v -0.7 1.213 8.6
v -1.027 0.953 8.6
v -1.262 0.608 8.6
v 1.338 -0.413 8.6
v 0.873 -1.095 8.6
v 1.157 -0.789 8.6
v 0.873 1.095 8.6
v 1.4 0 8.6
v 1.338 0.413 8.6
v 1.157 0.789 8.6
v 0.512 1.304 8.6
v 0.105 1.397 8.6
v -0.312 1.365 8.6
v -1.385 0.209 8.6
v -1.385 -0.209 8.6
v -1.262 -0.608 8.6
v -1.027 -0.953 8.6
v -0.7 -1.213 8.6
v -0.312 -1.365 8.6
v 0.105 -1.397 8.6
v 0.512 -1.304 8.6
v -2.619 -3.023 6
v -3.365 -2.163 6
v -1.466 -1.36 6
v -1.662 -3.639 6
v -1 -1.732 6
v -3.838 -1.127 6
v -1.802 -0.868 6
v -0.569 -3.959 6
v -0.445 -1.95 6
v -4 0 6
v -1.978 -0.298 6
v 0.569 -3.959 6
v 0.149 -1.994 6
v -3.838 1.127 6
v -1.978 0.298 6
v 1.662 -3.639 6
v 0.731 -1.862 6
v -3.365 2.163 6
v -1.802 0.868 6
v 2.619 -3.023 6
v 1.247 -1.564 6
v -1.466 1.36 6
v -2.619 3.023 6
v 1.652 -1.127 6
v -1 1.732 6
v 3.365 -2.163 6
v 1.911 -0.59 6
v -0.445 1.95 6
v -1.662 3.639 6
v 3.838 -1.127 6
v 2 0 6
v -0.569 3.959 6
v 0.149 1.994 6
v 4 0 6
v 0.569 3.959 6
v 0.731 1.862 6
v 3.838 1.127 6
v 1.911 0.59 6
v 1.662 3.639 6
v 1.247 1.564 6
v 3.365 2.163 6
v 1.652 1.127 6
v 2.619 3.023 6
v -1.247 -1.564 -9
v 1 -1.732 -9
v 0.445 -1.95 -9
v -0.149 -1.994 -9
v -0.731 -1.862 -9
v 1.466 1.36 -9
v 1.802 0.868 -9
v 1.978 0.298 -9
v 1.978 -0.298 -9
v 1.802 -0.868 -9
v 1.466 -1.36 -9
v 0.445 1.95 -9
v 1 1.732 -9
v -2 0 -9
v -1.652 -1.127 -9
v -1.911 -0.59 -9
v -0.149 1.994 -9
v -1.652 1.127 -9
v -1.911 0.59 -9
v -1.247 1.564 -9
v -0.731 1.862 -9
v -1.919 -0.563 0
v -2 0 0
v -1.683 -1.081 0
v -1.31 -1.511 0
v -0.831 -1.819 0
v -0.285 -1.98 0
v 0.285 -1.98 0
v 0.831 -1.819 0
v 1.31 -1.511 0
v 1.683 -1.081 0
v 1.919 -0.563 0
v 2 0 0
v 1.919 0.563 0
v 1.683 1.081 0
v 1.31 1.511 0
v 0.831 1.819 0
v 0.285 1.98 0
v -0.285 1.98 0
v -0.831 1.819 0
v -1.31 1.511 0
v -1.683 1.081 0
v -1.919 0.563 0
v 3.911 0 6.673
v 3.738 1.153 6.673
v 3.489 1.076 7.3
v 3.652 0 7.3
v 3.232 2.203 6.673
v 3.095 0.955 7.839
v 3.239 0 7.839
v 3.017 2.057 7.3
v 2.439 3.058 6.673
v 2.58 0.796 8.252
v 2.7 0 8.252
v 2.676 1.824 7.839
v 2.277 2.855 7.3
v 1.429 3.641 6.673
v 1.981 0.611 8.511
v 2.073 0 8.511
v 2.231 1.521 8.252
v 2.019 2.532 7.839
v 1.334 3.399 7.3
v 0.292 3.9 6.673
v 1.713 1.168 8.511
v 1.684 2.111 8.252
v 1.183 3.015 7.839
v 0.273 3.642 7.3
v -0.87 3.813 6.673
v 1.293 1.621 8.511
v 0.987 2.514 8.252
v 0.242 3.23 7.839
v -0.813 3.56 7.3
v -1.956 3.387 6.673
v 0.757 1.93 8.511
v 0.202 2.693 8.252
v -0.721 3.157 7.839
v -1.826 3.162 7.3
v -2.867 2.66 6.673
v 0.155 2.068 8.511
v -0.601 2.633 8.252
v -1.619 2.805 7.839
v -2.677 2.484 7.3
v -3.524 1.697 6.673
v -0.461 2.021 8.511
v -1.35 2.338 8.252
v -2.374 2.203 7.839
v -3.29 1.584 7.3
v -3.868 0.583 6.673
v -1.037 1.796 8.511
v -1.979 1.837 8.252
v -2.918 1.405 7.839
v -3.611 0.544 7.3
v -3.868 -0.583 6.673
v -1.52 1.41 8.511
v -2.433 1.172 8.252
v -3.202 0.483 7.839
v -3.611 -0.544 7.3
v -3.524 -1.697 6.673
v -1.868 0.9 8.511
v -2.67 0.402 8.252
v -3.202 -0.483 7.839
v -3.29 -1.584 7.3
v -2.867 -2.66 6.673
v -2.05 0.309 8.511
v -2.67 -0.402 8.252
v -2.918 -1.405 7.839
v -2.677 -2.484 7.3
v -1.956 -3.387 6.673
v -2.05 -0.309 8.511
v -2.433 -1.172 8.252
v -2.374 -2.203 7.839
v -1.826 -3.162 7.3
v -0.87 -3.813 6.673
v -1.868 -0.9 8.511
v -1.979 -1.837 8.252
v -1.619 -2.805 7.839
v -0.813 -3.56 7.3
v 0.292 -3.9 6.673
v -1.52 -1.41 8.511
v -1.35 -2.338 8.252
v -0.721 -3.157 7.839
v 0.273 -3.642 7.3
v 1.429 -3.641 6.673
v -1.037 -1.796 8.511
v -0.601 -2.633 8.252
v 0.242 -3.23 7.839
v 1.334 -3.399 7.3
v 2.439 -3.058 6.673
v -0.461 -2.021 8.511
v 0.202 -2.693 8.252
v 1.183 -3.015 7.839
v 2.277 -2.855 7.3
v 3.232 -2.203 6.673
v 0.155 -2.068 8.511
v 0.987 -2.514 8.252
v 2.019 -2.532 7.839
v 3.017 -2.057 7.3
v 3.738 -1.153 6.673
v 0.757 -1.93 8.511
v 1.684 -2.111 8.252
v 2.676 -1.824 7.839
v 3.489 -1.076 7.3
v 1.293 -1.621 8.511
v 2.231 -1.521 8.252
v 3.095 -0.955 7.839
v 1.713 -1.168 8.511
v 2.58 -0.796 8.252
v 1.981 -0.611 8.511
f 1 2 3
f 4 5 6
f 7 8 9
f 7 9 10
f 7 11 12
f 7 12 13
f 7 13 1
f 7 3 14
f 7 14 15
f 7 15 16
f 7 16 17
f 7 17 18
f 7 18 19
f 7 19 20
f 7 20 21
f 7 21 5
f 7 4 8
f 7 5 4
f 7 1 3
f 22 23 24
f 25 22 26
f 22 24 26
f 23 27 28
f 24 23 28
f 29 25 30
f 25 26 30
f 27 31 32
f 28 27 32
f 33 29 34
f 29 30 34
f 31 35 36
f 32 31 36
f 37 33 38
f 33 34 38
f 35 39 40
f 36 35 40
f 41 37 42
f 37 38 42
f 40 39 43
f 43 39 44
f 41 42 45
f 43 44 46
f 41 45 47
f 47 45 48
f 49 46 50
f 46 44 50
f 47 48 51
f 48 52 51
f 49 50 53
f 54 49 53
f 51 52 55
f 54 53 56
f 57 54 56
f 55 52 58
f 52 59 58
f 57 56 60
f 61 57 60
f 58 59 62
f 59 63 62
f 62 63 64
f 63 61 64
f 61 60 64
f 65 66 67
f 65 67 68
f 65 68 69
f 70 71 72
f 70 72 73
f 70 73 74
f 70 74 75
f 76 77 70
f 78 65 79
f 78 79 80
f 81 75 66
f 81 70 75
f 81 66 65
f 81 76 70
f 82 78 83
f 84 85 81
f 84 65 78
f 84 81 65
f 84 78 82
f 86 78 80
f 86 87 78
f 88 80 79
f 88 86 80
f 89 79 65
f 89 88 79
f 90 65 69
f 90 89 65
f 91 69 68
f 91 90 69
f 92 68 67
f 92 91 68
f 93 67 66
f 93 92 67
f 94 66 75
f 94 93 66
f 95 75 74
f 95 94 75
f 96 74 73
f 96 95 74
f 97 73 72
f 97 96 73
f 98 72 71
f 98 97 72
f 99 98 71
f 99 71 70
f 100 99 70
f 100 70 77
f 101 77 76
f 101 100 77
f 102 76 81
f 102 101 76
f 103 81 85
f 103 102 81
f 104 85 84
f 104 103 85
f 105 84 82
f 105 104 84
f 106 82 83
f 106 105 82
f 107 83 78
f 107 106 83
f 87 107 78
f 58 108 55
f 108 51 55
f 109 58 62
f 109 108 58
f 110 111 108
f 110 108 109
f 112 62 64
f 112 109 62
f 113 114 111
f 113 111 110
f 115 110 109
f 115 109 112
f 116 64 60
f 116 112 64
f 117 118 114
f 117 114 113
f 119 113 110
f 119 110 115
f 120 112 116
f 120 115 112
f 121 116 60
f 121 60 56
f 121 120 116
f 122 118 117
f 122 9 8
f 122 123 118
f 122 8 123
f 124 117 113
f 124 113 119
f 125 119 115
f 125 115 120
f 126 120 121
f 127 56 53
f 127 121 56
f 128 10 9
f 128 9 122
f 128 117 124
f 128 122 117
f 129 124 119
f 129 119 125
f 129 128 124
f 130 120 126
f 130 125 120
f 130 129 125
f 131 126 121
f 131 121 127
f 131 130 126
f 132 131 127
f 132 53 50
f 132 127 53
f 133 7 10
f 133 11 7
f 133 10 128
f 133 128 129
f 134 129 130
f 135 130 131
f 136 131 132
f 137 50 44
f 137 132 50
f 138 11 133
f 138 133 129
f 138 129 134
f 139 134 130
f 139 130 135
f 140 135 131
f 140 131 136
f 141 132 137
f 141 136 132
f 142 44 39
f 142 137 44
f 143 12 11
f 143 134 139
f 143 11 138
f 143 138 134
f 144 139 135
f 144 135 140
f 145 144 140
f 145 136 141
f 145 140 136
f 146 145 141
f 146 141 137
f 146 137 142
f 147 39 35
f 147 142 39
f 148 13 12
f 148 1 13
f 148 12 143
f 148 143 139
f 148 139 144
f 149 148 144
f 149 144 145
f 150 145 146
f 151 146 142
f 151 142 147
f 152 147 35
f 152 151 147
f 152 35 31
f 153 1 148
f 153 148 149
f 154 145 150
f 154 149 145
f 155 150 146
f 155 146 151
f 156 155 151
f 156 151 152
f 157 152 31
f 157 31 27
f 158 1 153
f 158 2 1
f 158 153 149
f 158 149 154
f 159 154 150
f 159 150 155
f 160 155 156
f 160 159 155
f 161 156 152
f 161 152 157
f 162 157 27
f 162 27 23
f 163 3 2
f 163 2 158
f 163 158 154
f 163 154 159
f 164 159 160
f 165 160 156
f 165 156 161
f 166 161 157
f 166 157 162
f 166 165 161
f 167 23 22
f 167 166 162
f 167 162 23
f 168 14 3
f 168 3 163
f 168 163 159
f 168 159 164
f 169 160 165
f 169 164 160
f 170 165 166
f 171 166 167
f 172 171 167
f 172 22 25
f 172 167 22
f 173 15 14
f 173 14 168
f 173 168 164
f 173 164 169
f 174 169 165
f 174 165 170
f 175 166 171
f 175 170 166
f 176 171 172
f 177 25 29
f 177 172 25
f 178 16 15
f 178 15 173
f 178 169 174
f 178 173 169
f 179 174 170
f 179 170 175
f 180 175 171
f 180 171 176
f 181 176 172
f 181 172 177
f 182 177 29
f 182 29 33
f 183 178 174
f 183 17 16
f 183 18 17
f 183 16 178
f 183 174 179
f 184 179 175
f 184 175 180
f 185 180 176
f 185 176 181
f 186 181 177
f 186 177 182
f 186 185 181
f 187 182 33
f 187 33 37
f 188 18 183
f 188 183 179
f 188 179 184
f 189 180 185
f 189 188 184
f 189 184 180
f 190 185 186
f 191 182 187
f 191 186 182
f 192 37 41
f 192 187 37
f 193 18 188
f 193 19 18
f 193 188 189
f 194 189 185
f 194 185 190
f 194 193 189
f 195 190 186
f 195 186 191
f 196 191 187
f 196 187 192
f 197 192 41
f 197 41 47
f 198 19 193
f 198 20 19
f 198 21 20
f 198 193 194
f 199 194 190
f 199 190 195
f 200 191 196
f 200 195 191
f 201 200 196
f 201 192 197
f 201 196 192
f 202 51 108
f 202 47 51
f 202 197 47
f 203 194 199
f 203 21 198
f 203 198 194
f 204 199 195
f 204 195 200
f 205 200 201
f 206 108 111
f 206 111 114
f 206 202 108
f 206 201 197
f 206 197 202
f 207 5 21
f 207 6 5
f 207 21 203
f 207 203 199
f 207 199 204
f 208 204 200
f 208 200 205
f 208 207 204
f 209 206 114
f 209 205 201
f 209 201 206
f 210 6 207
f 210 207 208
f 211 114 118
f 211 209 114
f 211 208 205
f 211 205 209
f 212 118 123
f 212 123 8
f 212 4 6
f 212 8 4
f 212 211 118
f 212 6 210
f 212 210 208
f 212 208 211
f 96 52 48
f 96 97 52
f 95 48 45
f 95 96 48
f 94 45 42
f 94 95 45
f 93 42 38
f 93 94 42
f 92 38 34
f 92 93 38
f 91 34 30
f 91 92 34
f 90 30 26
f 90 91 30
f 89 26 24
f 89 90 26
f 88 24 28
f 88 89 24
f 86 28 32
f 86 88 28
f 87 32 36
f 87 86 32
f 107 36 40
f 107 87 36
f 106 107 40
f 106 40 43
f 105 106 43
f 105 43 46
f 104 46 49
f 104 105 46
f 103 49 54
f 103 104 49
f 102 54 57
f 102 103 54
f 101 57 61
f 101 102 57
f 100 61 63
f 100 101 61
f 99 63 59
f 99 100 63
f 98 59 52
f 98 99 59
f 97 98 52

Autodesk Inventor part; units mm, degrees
ref_plane "YZ Plane" through (0, 0, 0) normal (1, 0, 0) x (0, 1, 0)
ref_plane "XZ Plane" through (0, 0, 0) normal (0, 1, 0) x (-1, 0, 0)
ref_plane "XY Plane" through (0, 0, 0) normal (0, 0, 1) x (1, 0, 0)
sketch "スケッチ1" plane through (0, 0, 0) normal (0, 0, 1) x (1, 0, 0)
  circle A0 centre (0, 0) radius 2
  dimension "d0" = 4
extrude "押し出し1" add sketch "スケッチ1" along normal blind 6
sketch "スケッチ2" plane through (0, 0, 6) normal (0, 0, 1) x (1, 0, 0)
  circle A0 centre (0, 0) radius 2 projected
  circle A1 centre (0, 0) radius 4
  dimension "d3" = 8
extrude "押し出し2" add sketch "スケッチ2" along normal blind 2.6 contours A0 | A1
fillet "フィレット1" radius 2.6 1 edges at (-4, 0, 8.6)
thread "ねじ1" size "M3x0.5" class "6g" standard "ANSI Metric M Profile" full length
sketch "スケッチ3" plane through (0, 0, 0) normal (0, 0, -1) x (-1, 0, 0)
  circle A0 centre (0, 0) radius 2 projected
extrude "押し出し3" add sketch "スケッチ3" along normal blind 9
properties part number "SB　m4 15mmなべネジ" material "Steel, Mild"
